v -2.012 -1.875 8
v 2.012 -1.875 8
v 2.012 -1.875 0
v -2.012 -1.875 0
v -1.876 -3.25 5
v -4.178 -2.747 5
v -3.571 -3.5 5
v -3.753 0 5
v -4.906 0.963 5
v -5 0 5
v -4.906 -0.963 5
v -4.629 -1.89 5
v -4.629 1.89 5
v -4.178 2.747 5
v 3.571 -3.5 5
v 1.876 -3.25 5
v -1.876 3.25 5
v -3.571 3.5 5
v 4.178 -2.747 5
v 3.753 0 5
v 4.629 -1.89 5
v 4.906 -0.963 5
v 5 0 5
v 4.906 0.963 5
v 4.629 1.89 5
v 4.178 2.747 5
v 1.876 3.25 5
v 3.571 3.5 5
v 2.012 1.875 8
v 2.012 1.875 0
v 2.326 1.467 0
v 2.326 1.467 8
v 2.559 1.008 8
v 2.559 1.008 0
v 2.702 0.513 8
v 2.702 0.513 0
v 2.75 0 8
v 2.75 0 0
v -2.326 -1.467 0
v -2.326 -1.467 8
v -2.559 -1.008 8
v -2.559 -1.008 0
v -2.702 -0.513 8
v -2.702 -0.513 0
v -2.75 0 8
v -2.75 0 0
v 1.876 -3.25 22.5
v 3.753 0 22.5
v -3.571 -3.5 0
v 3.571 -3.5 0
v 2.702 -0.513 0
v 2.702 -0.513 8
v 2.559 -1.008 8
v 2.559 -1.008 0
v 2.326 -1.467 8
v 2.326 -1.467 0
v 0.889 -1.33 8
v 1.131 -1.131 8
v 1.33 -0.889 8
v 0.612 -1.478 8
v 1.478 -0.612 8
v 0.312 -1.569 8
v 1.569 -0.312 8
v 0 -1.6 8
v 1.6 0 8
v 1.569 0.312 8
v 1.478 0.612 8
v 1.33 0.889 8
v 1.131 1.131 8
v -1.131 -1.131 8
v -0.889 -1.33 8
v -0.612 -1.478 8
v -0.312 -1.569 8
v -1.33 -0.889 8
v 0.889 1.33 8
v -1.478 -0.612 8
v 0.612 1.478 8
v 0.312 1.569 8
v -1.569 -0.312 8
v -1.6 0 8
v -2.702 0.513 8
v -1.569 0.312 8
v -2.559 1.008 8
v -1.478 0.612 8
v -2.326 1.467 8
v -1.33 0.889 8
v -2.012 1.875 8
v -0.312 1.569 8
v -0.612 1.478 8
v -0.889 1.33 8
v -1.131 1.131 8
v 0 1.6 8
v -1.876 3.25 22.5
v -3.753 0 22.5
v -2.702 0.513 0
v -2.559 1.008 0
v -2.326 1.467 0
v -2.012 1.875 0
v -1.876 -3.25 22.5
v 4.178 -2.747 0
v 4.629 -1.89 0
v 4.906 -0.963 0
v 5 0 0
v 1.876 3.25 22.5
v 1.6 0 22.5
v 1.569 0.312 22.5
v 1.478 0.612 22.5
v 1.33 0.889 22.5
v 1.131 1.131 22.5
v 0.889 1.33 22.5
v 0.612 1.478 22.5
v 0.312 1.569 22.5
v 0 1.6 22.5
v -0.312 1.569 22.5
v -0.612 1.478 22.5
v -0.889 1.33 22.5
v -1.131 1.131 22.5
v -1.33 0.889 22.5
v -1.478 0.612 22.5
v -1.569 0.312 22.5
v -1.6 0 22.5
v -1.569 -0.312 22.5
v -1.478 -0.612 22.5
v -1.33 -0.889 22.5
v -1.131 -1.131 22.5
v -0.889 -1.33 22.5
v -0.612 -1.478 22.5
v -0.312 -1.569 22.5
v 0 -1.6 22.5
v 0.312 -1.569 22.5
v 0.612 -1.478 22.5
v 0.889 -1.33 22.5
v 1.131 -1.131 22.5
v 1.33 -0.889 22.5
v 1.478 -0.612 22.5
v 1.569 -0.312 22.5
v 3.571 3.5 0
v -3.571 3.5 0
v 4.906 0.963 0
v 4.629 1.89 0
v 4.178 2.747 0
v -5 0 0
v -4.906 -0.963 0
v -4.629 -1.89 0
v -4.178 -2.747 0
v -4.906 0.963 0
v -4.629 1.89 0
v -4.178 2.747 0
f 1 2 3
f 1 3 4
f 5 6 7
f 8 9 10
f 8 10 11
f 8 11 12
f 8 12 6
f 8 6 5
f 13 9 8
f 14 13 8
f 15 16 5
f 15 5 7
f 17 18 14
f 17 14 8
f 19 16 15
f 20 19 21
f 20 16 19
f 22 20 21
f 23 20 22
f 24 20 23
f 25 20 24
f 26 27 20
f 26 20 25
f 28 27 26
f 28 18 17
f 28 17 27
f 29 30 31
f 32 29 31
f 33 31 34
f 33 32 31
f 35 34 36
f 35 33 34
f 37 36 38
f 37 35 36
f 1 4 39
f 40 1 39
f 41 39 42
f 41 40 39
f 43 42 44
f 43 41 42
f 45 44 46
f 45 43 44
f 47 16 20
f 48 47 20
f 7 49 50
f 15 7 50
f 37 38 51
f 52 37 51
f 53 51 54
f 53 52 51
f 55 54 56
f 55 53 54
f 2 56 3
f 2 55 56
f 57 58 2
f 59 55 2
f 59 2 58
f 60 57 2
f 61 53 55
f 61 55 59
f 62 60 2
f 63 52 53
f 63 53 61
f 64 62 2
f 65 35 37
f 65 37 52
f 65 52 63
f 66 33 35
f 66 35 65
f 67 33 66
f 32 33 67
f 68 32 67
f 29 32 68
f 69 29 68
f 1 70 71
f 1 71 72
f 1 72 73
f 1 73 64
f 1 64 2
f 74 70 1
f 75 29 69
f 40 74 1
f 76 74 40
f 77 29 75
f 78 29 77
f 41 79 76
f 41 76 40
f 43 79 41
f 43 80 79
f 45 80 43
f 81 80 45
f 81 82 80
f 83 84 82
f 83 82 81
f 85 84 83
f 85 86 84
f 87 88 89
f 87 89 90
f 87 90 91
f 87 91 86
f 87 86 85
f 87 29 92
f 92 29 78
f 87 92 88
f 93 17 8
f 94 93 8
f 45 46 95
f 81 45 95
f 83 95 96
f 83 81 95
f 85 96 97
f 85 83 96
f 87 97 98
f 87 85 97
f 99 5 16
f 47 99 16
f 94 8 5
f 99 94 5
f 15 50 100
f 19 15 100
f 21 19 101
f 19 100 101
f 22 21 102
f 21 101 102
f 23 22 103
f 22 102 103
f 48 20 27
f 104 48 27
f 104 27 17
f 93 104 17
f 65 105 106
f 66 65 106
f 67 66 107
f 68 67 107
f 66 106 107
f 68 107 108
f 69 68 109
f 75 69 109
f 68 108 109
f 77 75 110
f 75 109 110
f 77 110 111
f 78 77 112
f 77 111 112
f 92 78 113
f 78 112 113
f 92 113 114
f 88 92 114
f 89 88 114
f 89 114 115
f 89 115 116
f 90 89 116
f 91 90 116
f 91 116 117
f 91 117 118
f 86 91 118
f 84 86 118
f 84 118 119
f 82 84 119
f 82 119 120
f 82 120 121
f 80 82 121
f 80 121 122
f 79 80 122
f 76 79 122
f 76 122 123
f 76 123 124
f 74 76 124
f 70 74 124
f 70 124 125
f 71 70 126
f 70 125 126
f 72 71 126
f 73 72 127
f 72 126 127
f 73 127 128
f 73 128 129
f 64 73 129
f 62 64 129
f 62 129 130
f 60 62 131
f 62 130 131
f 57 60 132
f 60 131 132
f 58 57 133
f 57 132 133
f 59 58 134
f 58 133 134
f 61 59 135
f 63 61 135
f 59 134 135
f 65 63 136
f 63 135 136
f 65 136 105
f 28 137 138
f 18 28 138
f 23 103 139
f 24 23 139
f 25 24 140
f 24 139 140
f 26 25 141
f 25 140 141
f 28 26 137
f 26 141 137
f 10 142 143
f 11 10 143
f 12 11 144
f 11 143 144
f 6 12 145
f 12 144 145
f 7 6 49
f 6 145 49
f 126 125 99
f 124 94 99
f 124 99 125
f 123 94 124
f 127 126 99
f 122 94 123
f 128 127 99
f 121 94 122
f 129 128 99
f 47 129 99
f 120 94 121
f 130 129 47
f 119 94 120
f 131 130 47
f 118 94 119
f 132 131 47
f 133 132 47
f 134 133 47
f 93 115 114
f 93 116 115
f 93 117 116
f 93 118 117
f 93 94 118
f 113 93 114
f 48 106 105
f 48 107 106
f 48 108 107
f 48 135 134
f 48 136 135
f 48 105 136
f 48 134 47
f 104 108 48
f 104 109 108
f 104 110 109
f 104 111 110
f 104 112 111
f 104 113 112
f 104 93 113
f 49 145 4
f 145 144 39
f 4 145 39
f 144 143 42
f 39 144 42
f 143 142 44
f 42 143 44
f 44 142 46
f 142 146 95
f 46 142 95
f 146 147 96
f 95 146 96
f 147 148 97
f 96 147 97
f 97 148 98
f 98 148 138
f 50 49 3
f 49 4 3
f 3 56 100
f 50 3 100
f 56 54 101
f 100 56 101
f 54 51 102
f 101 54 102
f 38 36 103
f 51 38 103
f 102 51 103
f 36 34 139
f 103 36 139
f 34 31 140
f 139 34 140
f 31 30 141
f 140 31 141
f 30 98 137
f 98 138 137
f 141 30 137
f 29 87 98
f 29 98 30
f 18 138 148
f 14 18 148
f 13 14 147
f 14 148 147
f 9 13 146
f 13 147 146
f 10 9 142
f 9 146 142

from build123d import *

# Parameters (mm, degrees)
EXTRUDE_1_DEPTH     = 5
EXTRUDE_2_DEPTH     = 17.5
SKETCH_3_R          = 1.6
CUT_EXTRUDE_1_DEPTH = 24.313086454
CUT_EXTRUDE_START   = -8
CUT_EXTRUDE_2_DEPTH = 8


with BuildPart() as part:
    # 草图1 → 凸台-拉伸1 (new body)
    with BuildSketch(Plane.XY):
        with BuildLine():
            ThreePointArc((-3.570714214, 3.5), (-4.628907596, 1.890294809), (-5, 0))
            Line((-5, 0), (5, 0))
            ThreePointArc((5, 0), (4.628907596, 1.890294809), (3.570714214, 3.5))
            Line((3.570714214, 3.5), (-3.570714214, 3.5))
        make_face()
        with BuildLine():
            Line((5, 0), (-5, 0))
            ThreePointArc((-5, 0), (-4.628907596, -1.890294809), (-3.570714214, -3.5))
            Line((-3.570714214, -3.5), (3.570714214, -3.5))
            ThreePointArc((3.570714214, -3.5), (4.628907596, -1.890294809), (5, 0))
        make_face()
    extrude(amount=EXTRUDE_1_DEPTH)

    # 草图2 → 凸台-拉伸2 (add)
    with BuildSketch(Plane.XY.offset(5)):
        Polygon((1.876388375, 3.25), (-1.876388375, 3.25), (-3.75277675, 0), (-1.876388375, -3.25), (1.876388375, -3.25), (3.75277675, 0), align=None)
    extrude(amount=EXTRUDE_2_DEPTH)

    # 草图3 → 切除-拉伸1 (cut, through all)
    with BuildSketch(Plane.XY.offset(22.5)):
        Circle(SKETCH_3_R)
    extrude(amount=-CUT_EXTRUDE_1_DEPTH, mode=Mode.SUBTRACT)

    # 草图4 → 切除-拉伸2 (cut)
    with BuildSketch(Plane(origin=(0, 0, 0), x_dir=(-1, 0, 0), z_dir=(0, 0, -1)).offset(CUT_EXTRUDE_START)):
        with BuildLine():
            Line((2.011684617, 1.875), (-2.011684617, 1.875))
            ThreePointArc((-2.011684617, 1.875), (-2.55877243, 1.007563224), (-2.75, 0))
            Line((-2.75, 0), (-1.6, 0))
            ThreePointArc((-1.6, 0), (0, 1.6), (1.6, 0))
            Line((1.6, 0), (2.75, 0))
            ThreePointArc((2.75, 0), (2.55877243, 1.007563224), (2.011684617, 1.875))
        make_face()
        with BuildLine():
            Line((-1.6, 0), (-2.75, 0))
            ThreePointArc((-2.75, 0), (-2.55877243, -1.007563224), (-2.011684617, -1.875))
            Line((-2.011684617, -1.875), (2.011684617, -1.875))
            ThreePointArc((2.011684617, -1.875), (2.55877243, -1.007563224), (2.75, 0))
            Line((2.75, 0), (1.6, 0))
            ThreePointArc((1.6, 0), (0, -1.6), (-1.6, 0))
        make_face()
    extrude(amount=CUT_EXTRUDE_2_DEPTH, mode=Mode.SUBTRACT)


solid = part.part
